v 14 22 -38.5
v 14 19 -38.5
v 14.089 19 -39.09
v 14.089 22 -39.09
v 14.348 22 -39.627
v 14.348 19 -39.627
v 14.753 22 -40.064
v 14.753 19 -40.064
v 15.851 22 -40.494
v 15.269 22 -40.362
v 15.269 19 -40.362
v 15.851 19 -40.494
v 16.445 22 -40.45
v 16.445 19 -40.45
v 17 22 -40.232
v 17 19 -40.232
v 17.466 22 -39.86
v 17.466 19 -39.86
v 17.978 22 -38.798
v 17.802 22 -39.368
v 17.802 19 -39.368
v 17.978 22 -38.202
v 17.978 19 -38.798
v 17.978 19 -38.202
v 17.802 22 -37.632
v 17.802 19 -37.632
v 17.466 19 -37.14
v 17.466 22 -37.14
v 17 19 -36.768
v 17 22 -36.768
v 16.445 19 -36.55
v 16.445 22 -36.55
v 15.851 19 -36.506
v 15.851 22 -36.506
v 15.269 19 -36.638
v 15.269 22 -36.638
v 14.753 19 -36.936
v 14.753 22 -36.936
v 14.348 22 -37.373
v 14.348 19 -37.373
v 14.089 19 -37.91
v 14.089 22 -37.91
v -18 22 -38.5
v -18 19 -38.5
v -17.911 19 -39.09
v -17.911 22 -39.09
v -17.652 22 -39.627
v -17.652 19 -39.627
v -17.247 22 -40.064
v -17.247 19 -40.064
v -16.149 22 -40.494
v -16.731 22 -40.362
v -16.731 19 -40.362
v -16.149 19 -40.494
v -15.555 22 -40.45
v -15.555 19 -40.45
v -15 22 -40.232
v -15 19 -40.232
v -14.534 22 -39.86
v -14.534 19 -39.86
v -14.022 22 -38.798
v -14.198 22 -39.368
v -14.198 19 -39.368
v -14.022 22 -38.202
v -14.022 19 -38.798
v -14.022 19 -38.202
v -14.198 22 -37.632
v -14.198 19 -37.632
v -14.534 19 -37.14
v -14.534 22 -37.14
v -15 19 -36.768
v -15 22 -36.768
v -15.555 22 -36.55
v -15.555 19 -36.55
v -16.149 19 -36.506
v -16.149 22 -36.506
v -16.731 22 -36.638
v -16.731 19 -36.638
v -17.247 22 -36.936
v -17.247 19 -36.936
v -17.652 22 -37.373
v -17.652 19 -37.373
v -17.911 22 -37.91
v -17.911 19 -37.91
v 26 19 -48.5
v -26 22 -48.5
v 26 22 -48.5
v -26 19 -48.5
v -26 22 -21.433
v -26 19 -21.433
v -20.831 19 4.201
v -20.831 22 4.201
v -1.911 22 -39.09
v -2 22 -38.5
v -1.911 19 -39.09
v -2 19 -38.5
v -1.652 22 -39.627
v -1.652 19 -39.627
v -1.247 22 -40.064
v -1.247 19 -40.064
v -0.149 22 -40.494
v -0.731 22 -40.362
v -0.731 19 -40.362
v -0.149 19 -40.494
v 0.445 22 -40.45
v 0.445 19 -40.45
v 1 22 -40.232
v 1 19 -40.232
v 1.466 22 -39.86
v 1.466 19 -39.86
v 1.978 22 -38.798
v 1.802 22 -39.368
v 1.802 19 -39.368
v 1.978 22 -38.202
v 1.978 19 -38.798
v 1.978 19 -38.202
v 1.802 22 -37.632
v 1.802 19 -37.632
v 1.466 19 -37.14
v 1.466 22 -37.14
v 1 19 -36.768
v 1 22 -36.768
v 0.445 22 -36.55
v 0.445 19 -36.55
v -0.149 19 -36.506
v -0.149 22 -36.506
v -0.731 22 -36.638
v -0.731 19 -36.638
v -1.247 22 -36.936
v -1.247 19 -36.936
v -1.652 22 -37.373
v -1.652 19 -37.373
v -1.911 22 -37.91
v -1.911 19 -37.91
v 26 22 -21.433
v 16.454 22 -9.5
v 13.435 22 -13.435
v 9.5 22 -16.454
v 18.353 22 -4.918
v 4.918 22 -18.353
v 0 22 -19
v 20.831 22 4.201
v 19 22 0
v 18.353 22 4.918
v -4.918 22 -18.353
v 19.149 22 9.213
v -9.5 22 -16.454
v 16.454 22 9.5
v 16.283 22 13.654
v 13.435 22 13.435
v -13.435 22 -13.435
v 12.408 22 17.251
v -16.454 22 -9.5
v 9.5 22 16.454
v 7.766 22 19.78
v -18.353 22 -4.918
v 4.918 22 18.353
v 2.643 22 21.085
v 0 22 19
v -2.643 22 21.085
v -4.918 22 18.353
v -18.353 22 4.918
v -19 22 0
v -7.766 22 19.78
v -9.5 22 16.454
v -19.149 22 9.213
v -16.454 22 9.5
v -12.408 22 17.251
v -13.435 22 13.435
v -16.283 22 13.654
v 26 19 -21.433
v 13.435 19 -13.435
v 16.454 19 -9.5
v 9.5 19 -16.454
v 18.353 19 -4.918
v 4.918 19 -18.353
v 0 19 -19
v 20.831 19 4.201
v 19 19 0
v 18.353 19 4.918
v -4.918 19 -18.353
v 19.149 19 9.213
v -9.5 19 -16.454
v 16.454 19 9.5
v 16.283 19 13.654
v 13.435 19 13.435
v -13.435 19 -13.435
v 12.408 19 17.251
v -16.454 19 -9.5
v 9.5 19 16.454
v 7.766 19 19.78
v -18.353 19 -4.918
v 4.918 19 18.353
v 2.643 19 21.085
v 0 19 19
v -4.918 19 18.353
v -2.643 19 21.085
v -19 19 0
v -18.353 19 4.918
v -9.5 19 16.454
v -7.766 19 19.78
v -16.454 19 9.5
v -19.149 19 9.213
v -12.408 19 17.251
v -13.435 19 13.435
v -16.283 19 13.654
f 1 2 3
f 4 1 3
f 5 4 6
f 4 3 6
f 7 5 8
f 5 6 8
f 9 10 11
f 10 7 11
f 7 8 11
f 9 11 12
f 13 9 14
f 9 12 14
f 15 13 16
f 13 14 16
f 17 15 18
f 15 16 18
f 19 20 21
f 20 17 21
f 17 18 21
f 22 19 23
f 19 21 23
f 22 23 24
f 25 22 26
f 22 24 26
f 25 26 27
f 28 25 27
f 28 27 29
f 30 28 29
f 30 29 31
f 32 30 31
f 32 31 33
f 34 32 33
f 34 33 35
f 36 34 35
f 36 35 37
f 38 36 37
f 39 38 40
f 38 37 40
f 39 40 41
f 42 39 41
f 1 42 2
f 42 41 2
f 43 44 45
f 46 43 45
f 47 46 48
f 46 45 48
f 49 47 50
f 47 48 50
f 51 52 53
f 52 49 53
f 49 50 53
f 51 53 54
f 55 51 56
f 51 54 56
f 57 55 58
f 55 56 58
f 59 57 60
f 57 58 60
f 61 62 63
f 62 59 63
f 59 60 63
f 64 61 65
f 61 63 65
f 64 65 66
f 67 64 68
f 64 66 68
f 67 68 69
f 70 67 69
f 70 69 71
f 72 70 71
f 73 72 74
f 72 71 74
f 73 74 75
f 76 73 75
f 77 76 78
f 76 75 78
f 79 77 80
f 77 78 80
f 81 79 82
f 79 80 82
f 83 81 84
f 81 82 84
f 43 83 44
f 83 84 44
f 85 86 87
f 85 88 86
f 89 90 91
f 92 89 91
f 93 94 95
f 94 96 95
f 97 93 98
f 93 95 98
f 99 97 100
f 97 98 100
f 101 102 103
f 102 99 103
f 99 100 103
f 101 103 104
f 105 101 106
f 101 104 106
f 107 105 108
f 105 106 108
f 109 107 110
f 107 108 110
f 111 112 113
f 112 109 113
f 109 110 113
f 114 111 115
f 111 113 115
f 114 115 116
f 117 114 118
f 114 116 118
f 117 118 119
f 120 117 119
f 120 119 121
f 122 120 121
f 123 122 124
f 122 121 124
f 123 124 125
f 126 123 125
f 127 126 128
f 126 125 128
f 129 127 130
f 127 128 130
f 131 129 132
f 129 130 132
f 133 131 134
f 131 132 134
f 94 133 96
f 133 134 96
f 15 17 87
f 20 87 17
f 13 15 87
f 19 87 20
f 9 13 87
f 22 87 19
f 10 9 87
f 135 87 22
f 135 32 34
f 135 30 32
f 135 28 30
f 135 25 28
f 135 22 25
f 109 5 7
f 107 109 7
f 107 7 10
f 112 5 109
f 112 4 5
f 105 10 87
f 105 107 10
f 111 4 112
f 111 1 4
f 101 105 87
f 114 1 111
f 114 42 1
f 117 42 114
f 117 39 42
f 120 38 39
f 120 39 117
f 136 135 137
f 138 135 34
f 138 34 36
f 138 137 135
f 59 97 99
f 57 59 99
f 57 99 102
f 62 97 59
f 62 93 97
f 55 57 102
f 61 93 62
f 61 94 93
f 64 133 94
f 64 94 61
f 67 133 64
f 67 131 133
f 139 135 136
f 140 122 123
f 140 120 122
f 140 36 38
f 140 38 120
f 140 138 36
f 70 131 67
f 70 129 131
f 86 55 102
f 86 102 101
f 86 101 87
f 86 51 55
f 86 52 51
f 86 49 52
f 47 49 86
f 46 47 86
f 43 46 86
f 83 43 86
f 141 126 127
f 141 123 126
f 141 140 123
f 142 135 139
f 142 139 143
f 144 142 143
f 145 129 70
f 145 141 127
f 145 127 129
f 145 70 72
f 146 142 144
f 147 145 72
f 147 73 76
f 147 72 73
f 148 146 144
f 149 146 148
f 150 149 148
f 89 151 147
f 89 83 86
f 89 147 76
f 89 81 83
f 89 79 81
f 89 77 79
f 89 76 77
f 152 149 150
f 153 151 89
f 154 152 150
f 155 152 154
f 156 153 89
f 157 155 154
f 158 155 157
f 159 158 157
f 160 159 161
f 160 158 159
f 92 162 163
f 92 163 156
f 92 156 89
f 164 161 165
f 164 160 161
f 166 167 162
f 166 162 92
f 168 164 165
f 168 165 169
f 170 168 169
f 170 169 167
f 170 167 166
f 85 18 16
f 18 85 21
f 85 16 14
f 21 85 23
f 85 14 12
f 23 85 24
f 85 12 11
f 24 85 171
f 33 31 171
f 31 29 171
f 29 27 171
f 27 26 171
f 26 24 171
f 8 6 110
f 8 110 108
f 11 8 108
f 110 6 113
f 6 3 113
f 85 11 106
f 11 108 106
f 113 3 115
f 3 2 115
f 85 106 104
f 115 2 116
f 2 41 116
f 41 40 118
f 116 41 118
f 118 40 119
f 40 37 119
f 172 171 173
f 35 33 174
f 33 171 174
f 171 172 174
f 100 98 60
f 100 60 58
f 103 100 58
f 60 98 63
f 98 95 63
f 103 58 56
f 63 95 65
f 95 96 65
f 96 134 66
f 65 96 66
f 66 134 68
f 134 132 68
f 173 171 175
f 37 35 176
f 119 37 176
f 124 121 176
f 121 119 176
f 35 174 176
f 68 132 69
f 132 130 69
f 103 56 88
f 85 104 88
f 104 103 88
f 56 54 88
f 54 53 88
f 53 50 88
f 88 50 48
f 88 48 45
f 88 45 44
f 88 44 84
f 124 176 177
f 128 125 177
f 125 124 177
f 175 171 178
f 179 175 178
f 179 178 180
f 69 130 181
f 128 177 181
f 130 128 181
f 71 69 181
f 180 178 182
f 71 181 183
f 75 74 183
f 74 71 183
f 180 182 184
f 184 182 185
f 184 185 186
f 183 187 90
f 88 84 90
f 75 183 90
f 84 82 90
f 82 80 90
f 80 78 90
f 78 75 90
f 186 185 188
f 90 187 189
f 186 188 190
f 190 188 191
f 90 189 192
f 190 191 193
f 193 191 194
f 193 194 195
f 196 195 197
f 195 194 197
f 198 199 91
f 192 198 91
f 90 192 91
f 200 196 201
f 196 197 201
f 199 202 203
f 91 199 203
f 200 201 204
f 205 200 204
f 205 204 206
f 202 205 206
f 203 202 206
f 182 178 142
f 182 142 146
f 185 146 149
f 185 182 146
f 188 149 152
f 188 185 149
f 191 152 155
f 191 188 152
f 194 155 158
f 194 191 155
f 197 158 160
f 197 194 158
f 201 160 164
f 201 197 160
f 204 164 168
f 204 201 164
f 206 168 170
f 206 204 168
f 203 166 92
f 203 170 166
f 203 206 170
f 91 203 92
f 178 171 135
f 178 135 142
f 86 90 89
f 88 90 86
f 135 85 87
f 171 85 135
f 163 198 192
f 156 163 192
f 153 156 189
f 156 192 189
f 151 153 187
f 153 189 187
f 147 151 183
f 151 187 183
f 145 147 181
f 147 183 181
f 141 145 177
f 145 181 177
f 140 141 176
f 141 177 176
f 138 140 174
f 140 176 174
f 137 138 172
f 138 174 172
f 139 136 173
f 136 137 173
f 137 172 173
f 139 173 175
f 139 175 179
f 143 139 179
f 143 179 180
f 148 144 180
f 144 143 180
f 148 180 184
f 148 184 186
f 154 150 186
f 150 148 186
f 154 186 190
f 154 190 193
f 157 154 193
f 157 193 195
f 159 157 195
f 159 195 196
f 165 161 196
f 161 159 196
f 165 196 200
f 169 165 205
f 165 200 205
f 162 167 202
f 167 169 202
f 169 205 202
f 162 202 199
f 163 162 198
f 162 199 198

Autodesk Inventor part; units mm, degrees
ref_plane "YZ Plane" through (0, 0, 0) normal (1, 0, 0) x (0, 1, 0)
ref_plane "XZ Plane" through (0, 0, 0) normal (0, 1, 0) x (-1, 0, 0)
ref_plane "XY Plane" through (0, 0, 0) normal (0, 0, 1) x (1, 0, 0)
sketch "Эскиз1" plane through (19.6324, 19, -8.132) normal (0, 1, 0) x (-1, 0, 0)
  circle A0 centre (19.6324, -30.368) radius 2
  line L0 (-6.3676, -13.3012) -> (45.6324, -13.3012)
  line L1 (45.6324, -13.3012) -> (45.6324, -40.368)
  line L2 (45.6324, -40.368) -> (-6.3676, -40.368)
  line L3 (-6.3676, -40.368) -> (-6.3676, -13.3012)
  circle A1 centre (35.6324, -30.368) radius 2
  circle A2 centre (3.6324, -30.368) radius 2
  circle A3 centre (19.6324, 8.132) radius 21.25
  line L4 (-6.3676, -13.3012) -> (-1.1982, 12.3327)
  line L5 (45.6324, -13.3012) -> (40.4631, 12.3327)
  circle A4 centre (19.6324, 8.132) radius 19
  point P0 (19.6324, -13.3012)
  dimension "d0" = 4
  dimension "d1" = 38.5
  dimension "d2" = 4
  dimension "d3" = 16
  dimension "d4" = 4
  dimension "d5" = 16
  dimension "d6" = 10
  dimension "d7" = 10
  dimension "d8" = 10
  dimension "d9" = 0
  dimension "d10" = 42.5
  dimension "d11" = 38
extrude "Выдавливание1" add sketch "Эскиз1" along normal blind 3
sketch "Эскиз2" plane through (20.8701, -13, -4) normal (0, 0, 1) x (1, 0, 0)
  line L0 (-44.8118, 9.5085) -> (8.0594, 9.5085)
  line L1 (8.0594, 9.5085) -> (8.0594, -14.2907)
  line L2 (8.0594, -14.2907) -> (-44.8118, -14.2907)
  line L3 (-44.8118, -14.2907) -> (-44.8118, 9.5085)
  point P0 (-20.8701, 13)
extrude "Выдавливание2" cut sketch "Эскиз2" along normal blind 30
sketch "Эскиз3" plane through (19.6324, 19, -8.132) normal (0, -1, 0) x (1, 0, 0)
  circle A0 centre (-19.6324, 8.132) radius 21.25
  dimension "d16" = 42.5
properties part number "Заднее крпление"
